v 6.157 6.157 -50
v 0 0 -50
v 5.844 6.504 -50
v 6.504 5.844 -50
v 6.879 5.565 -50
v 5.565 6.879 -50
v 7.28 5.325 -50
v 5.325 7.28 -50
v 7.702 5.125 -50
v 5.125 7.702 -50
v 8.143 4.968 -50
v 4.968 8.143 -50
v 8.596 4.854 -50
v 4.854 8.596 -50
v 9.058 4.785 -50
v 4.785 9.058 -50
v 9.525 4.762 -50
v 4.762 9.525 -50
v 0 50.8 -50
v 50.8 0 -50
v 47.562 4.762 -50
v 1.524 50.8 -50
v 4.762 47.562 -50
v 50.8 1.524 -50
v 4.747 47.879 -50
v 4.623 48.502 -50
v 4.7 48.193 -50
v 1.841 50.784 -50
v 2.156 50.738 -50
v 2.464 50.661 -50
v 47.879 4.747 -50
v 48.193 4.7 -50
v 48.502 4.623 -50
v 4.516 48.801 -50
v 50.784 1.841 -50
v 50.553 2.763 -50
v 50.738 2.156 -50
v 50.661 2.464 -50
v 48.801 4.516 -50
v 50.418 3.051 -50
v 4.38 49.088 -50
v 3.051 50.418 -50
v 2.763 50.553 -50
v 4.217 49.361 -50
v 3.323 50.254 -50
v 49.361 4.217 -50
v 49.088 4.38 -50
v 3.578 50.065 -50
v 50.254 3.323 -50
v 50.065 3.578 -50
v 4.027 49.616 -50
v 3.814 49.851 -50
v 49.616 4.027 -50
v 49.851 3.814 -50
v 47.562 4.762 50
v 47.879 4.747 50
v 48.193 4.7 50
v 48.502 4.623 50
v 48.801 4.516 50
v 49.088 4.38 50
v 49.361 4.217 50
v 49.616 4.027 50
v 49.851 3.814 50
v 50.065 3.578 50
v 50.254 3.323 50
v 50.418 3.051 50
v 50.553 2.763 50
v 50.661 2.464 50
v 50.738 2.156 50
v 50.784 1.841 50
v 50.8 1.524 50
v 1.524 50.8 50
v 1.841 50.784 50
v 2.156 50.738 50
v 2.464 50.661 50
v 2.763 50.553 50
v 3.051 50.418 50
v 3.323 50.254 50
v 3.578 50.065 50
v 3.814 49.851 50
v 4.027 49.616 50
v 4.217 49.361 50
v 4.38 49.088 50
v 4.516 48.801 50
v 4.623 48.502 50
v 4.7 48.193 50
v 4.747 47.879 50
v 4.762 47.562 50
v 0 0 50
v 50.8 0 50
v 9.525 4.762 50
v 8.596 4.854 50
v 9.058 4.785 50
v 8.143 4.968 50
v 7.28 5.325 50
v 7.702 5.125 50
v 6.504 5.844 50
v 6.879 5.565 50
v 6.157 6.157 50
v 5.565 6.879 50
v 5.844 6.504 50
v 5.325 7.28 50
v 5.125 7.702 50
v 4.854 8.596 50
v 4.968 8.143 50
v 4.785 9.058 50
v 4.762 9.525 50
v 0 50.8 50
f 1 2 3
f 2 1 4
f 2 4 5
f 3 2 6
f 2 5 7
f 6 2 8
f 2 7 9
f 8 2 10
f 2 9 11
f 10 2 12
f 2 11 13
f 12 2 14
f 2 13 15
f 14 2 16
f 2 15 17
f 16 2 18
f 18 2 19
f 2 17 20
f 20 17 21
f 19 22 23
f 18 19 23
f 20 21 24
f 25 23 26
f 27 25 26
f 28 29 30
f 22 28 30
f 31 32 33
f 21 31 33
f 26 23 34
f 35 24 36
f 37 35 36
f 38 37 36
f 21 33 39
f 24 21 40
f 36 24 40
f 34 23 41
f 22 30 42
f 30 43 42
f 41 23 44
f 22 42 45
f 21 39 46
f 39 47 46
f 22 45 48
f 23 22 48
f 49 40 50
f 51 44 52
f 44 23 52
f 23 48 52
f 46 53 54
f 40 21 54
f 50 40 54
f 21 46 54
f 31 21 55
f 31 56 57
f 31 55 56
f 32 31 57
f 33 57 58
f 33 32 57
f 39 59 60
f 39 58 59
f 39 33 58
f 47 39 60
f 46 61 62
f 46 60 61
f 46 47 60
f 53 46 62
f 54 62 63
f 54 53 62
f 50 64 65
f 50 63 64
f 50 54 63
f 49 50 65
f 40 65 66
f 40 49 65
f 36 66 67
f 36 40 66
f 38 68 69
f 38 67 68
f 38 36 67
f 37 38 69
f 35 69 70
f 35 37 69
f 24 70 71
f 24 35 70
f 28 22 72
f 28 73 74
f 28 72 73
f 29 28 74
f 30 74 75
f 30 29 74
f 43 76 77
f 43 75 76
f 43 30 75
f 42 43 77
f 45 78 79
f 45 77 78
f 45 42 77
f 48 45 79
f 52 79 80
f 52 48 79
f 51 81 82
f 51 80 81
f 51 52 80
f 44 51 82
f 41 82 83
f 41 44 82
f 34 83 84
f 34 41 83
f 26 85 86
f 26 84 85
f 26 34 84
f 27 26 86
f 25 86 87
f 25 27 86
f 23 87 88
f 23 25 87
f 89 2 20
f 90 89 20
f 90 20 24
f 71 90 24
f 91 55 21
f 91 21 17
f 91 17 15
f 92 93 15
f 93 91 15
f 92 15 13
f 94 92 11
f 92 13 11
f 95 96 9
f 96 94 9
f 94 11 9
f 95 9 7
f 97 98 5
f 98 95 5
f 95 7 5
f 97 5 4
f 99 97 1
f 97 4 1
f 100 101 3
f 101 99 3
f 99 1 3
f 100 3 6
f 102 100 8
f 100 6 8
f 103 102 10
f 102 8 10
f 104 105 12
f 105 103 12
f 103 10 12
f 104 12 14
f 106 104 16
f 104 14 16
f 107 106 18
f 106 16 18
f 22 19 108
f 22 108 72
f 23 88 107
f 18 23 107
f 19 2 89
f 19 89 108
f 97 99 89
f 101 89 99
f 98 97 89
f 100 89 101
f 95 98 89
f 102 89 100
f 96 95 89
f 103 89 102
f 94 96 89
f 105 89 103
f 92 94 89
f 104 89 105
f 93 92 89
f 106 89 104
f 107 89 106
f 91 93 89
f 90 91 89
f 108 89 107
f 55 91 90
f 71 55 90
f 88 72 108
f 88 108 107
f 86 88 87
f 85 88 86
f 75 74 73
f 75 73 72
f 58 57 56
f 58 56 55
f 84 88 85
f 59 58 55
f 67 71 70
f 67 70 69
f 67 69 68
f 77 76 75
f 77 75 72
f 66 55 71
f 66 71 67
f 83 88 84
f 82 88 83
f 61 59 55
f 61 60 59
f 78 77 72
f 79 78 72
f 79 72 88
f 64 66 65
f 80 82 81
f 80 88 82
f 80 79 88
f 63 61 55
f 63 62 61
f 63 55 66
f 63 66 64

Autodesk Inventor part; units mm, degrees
ref_plane "YZ Plane" through (0, 0, 0) normal (1, 0, 0) x (0, 1, 0)
ref_plane "XZ Plane" through (0, 0, 0) normal (0, 1, 0) x (-1, 0, 0)
ref_plane "XY Plane" through (0, 0, 0) normal (0, 0, 1) x (1, 0, 0)
sketch "Sketch1" plane through (0, 0, 0) normal (0, 0, 1) x (1, 0, 0)
  line L0 (0, 0) -> (0, 50.8)
  line L1 (0, 50.8) -> (1.524, 50.8)
  line L2 (4.7625, 47.5615) -> (4.7625, 9.525)
  line L3 (0, 0) -> (50.8, 0)
  line L4 (50.8, 0) -> (50.8, 1.524)
  line L5 (47.5615, 4.7625) -> (9.525, 4.7625)
  arc A0 (4.7625, 9.525) -> (9.525, 4.7625) centre (9.525, 9.525) ccw
  arc A1 (4.7625, 47.5615) -> (1.524, 50.8) centre (1.524, 47.5615) ccw
  arc A2 (50.8, 1.524) -> (47.5615, 4.7625) centre (47.5615, 1.524) ccw
  dimension "thickness" = 4.7625
  dimension "d3" = 4.7625
  dimension "LegSize" = 50.8
  dimension "d5" = 50.8
  dimension "radius" = 4.7625
  dimension "d7" = 3.2385
  dimension "d8" = 3.2385
extrude "2\" X 2\" X 3/16\"" add sketch "Sketch1" along normal mid plane 100
equation "\"d3\" = thickness"
equation "\"d5\" = LegSize"
properties part number "ANGLE IRON, 2 X 2 X 0.188 THK" material "Angle Iron"
